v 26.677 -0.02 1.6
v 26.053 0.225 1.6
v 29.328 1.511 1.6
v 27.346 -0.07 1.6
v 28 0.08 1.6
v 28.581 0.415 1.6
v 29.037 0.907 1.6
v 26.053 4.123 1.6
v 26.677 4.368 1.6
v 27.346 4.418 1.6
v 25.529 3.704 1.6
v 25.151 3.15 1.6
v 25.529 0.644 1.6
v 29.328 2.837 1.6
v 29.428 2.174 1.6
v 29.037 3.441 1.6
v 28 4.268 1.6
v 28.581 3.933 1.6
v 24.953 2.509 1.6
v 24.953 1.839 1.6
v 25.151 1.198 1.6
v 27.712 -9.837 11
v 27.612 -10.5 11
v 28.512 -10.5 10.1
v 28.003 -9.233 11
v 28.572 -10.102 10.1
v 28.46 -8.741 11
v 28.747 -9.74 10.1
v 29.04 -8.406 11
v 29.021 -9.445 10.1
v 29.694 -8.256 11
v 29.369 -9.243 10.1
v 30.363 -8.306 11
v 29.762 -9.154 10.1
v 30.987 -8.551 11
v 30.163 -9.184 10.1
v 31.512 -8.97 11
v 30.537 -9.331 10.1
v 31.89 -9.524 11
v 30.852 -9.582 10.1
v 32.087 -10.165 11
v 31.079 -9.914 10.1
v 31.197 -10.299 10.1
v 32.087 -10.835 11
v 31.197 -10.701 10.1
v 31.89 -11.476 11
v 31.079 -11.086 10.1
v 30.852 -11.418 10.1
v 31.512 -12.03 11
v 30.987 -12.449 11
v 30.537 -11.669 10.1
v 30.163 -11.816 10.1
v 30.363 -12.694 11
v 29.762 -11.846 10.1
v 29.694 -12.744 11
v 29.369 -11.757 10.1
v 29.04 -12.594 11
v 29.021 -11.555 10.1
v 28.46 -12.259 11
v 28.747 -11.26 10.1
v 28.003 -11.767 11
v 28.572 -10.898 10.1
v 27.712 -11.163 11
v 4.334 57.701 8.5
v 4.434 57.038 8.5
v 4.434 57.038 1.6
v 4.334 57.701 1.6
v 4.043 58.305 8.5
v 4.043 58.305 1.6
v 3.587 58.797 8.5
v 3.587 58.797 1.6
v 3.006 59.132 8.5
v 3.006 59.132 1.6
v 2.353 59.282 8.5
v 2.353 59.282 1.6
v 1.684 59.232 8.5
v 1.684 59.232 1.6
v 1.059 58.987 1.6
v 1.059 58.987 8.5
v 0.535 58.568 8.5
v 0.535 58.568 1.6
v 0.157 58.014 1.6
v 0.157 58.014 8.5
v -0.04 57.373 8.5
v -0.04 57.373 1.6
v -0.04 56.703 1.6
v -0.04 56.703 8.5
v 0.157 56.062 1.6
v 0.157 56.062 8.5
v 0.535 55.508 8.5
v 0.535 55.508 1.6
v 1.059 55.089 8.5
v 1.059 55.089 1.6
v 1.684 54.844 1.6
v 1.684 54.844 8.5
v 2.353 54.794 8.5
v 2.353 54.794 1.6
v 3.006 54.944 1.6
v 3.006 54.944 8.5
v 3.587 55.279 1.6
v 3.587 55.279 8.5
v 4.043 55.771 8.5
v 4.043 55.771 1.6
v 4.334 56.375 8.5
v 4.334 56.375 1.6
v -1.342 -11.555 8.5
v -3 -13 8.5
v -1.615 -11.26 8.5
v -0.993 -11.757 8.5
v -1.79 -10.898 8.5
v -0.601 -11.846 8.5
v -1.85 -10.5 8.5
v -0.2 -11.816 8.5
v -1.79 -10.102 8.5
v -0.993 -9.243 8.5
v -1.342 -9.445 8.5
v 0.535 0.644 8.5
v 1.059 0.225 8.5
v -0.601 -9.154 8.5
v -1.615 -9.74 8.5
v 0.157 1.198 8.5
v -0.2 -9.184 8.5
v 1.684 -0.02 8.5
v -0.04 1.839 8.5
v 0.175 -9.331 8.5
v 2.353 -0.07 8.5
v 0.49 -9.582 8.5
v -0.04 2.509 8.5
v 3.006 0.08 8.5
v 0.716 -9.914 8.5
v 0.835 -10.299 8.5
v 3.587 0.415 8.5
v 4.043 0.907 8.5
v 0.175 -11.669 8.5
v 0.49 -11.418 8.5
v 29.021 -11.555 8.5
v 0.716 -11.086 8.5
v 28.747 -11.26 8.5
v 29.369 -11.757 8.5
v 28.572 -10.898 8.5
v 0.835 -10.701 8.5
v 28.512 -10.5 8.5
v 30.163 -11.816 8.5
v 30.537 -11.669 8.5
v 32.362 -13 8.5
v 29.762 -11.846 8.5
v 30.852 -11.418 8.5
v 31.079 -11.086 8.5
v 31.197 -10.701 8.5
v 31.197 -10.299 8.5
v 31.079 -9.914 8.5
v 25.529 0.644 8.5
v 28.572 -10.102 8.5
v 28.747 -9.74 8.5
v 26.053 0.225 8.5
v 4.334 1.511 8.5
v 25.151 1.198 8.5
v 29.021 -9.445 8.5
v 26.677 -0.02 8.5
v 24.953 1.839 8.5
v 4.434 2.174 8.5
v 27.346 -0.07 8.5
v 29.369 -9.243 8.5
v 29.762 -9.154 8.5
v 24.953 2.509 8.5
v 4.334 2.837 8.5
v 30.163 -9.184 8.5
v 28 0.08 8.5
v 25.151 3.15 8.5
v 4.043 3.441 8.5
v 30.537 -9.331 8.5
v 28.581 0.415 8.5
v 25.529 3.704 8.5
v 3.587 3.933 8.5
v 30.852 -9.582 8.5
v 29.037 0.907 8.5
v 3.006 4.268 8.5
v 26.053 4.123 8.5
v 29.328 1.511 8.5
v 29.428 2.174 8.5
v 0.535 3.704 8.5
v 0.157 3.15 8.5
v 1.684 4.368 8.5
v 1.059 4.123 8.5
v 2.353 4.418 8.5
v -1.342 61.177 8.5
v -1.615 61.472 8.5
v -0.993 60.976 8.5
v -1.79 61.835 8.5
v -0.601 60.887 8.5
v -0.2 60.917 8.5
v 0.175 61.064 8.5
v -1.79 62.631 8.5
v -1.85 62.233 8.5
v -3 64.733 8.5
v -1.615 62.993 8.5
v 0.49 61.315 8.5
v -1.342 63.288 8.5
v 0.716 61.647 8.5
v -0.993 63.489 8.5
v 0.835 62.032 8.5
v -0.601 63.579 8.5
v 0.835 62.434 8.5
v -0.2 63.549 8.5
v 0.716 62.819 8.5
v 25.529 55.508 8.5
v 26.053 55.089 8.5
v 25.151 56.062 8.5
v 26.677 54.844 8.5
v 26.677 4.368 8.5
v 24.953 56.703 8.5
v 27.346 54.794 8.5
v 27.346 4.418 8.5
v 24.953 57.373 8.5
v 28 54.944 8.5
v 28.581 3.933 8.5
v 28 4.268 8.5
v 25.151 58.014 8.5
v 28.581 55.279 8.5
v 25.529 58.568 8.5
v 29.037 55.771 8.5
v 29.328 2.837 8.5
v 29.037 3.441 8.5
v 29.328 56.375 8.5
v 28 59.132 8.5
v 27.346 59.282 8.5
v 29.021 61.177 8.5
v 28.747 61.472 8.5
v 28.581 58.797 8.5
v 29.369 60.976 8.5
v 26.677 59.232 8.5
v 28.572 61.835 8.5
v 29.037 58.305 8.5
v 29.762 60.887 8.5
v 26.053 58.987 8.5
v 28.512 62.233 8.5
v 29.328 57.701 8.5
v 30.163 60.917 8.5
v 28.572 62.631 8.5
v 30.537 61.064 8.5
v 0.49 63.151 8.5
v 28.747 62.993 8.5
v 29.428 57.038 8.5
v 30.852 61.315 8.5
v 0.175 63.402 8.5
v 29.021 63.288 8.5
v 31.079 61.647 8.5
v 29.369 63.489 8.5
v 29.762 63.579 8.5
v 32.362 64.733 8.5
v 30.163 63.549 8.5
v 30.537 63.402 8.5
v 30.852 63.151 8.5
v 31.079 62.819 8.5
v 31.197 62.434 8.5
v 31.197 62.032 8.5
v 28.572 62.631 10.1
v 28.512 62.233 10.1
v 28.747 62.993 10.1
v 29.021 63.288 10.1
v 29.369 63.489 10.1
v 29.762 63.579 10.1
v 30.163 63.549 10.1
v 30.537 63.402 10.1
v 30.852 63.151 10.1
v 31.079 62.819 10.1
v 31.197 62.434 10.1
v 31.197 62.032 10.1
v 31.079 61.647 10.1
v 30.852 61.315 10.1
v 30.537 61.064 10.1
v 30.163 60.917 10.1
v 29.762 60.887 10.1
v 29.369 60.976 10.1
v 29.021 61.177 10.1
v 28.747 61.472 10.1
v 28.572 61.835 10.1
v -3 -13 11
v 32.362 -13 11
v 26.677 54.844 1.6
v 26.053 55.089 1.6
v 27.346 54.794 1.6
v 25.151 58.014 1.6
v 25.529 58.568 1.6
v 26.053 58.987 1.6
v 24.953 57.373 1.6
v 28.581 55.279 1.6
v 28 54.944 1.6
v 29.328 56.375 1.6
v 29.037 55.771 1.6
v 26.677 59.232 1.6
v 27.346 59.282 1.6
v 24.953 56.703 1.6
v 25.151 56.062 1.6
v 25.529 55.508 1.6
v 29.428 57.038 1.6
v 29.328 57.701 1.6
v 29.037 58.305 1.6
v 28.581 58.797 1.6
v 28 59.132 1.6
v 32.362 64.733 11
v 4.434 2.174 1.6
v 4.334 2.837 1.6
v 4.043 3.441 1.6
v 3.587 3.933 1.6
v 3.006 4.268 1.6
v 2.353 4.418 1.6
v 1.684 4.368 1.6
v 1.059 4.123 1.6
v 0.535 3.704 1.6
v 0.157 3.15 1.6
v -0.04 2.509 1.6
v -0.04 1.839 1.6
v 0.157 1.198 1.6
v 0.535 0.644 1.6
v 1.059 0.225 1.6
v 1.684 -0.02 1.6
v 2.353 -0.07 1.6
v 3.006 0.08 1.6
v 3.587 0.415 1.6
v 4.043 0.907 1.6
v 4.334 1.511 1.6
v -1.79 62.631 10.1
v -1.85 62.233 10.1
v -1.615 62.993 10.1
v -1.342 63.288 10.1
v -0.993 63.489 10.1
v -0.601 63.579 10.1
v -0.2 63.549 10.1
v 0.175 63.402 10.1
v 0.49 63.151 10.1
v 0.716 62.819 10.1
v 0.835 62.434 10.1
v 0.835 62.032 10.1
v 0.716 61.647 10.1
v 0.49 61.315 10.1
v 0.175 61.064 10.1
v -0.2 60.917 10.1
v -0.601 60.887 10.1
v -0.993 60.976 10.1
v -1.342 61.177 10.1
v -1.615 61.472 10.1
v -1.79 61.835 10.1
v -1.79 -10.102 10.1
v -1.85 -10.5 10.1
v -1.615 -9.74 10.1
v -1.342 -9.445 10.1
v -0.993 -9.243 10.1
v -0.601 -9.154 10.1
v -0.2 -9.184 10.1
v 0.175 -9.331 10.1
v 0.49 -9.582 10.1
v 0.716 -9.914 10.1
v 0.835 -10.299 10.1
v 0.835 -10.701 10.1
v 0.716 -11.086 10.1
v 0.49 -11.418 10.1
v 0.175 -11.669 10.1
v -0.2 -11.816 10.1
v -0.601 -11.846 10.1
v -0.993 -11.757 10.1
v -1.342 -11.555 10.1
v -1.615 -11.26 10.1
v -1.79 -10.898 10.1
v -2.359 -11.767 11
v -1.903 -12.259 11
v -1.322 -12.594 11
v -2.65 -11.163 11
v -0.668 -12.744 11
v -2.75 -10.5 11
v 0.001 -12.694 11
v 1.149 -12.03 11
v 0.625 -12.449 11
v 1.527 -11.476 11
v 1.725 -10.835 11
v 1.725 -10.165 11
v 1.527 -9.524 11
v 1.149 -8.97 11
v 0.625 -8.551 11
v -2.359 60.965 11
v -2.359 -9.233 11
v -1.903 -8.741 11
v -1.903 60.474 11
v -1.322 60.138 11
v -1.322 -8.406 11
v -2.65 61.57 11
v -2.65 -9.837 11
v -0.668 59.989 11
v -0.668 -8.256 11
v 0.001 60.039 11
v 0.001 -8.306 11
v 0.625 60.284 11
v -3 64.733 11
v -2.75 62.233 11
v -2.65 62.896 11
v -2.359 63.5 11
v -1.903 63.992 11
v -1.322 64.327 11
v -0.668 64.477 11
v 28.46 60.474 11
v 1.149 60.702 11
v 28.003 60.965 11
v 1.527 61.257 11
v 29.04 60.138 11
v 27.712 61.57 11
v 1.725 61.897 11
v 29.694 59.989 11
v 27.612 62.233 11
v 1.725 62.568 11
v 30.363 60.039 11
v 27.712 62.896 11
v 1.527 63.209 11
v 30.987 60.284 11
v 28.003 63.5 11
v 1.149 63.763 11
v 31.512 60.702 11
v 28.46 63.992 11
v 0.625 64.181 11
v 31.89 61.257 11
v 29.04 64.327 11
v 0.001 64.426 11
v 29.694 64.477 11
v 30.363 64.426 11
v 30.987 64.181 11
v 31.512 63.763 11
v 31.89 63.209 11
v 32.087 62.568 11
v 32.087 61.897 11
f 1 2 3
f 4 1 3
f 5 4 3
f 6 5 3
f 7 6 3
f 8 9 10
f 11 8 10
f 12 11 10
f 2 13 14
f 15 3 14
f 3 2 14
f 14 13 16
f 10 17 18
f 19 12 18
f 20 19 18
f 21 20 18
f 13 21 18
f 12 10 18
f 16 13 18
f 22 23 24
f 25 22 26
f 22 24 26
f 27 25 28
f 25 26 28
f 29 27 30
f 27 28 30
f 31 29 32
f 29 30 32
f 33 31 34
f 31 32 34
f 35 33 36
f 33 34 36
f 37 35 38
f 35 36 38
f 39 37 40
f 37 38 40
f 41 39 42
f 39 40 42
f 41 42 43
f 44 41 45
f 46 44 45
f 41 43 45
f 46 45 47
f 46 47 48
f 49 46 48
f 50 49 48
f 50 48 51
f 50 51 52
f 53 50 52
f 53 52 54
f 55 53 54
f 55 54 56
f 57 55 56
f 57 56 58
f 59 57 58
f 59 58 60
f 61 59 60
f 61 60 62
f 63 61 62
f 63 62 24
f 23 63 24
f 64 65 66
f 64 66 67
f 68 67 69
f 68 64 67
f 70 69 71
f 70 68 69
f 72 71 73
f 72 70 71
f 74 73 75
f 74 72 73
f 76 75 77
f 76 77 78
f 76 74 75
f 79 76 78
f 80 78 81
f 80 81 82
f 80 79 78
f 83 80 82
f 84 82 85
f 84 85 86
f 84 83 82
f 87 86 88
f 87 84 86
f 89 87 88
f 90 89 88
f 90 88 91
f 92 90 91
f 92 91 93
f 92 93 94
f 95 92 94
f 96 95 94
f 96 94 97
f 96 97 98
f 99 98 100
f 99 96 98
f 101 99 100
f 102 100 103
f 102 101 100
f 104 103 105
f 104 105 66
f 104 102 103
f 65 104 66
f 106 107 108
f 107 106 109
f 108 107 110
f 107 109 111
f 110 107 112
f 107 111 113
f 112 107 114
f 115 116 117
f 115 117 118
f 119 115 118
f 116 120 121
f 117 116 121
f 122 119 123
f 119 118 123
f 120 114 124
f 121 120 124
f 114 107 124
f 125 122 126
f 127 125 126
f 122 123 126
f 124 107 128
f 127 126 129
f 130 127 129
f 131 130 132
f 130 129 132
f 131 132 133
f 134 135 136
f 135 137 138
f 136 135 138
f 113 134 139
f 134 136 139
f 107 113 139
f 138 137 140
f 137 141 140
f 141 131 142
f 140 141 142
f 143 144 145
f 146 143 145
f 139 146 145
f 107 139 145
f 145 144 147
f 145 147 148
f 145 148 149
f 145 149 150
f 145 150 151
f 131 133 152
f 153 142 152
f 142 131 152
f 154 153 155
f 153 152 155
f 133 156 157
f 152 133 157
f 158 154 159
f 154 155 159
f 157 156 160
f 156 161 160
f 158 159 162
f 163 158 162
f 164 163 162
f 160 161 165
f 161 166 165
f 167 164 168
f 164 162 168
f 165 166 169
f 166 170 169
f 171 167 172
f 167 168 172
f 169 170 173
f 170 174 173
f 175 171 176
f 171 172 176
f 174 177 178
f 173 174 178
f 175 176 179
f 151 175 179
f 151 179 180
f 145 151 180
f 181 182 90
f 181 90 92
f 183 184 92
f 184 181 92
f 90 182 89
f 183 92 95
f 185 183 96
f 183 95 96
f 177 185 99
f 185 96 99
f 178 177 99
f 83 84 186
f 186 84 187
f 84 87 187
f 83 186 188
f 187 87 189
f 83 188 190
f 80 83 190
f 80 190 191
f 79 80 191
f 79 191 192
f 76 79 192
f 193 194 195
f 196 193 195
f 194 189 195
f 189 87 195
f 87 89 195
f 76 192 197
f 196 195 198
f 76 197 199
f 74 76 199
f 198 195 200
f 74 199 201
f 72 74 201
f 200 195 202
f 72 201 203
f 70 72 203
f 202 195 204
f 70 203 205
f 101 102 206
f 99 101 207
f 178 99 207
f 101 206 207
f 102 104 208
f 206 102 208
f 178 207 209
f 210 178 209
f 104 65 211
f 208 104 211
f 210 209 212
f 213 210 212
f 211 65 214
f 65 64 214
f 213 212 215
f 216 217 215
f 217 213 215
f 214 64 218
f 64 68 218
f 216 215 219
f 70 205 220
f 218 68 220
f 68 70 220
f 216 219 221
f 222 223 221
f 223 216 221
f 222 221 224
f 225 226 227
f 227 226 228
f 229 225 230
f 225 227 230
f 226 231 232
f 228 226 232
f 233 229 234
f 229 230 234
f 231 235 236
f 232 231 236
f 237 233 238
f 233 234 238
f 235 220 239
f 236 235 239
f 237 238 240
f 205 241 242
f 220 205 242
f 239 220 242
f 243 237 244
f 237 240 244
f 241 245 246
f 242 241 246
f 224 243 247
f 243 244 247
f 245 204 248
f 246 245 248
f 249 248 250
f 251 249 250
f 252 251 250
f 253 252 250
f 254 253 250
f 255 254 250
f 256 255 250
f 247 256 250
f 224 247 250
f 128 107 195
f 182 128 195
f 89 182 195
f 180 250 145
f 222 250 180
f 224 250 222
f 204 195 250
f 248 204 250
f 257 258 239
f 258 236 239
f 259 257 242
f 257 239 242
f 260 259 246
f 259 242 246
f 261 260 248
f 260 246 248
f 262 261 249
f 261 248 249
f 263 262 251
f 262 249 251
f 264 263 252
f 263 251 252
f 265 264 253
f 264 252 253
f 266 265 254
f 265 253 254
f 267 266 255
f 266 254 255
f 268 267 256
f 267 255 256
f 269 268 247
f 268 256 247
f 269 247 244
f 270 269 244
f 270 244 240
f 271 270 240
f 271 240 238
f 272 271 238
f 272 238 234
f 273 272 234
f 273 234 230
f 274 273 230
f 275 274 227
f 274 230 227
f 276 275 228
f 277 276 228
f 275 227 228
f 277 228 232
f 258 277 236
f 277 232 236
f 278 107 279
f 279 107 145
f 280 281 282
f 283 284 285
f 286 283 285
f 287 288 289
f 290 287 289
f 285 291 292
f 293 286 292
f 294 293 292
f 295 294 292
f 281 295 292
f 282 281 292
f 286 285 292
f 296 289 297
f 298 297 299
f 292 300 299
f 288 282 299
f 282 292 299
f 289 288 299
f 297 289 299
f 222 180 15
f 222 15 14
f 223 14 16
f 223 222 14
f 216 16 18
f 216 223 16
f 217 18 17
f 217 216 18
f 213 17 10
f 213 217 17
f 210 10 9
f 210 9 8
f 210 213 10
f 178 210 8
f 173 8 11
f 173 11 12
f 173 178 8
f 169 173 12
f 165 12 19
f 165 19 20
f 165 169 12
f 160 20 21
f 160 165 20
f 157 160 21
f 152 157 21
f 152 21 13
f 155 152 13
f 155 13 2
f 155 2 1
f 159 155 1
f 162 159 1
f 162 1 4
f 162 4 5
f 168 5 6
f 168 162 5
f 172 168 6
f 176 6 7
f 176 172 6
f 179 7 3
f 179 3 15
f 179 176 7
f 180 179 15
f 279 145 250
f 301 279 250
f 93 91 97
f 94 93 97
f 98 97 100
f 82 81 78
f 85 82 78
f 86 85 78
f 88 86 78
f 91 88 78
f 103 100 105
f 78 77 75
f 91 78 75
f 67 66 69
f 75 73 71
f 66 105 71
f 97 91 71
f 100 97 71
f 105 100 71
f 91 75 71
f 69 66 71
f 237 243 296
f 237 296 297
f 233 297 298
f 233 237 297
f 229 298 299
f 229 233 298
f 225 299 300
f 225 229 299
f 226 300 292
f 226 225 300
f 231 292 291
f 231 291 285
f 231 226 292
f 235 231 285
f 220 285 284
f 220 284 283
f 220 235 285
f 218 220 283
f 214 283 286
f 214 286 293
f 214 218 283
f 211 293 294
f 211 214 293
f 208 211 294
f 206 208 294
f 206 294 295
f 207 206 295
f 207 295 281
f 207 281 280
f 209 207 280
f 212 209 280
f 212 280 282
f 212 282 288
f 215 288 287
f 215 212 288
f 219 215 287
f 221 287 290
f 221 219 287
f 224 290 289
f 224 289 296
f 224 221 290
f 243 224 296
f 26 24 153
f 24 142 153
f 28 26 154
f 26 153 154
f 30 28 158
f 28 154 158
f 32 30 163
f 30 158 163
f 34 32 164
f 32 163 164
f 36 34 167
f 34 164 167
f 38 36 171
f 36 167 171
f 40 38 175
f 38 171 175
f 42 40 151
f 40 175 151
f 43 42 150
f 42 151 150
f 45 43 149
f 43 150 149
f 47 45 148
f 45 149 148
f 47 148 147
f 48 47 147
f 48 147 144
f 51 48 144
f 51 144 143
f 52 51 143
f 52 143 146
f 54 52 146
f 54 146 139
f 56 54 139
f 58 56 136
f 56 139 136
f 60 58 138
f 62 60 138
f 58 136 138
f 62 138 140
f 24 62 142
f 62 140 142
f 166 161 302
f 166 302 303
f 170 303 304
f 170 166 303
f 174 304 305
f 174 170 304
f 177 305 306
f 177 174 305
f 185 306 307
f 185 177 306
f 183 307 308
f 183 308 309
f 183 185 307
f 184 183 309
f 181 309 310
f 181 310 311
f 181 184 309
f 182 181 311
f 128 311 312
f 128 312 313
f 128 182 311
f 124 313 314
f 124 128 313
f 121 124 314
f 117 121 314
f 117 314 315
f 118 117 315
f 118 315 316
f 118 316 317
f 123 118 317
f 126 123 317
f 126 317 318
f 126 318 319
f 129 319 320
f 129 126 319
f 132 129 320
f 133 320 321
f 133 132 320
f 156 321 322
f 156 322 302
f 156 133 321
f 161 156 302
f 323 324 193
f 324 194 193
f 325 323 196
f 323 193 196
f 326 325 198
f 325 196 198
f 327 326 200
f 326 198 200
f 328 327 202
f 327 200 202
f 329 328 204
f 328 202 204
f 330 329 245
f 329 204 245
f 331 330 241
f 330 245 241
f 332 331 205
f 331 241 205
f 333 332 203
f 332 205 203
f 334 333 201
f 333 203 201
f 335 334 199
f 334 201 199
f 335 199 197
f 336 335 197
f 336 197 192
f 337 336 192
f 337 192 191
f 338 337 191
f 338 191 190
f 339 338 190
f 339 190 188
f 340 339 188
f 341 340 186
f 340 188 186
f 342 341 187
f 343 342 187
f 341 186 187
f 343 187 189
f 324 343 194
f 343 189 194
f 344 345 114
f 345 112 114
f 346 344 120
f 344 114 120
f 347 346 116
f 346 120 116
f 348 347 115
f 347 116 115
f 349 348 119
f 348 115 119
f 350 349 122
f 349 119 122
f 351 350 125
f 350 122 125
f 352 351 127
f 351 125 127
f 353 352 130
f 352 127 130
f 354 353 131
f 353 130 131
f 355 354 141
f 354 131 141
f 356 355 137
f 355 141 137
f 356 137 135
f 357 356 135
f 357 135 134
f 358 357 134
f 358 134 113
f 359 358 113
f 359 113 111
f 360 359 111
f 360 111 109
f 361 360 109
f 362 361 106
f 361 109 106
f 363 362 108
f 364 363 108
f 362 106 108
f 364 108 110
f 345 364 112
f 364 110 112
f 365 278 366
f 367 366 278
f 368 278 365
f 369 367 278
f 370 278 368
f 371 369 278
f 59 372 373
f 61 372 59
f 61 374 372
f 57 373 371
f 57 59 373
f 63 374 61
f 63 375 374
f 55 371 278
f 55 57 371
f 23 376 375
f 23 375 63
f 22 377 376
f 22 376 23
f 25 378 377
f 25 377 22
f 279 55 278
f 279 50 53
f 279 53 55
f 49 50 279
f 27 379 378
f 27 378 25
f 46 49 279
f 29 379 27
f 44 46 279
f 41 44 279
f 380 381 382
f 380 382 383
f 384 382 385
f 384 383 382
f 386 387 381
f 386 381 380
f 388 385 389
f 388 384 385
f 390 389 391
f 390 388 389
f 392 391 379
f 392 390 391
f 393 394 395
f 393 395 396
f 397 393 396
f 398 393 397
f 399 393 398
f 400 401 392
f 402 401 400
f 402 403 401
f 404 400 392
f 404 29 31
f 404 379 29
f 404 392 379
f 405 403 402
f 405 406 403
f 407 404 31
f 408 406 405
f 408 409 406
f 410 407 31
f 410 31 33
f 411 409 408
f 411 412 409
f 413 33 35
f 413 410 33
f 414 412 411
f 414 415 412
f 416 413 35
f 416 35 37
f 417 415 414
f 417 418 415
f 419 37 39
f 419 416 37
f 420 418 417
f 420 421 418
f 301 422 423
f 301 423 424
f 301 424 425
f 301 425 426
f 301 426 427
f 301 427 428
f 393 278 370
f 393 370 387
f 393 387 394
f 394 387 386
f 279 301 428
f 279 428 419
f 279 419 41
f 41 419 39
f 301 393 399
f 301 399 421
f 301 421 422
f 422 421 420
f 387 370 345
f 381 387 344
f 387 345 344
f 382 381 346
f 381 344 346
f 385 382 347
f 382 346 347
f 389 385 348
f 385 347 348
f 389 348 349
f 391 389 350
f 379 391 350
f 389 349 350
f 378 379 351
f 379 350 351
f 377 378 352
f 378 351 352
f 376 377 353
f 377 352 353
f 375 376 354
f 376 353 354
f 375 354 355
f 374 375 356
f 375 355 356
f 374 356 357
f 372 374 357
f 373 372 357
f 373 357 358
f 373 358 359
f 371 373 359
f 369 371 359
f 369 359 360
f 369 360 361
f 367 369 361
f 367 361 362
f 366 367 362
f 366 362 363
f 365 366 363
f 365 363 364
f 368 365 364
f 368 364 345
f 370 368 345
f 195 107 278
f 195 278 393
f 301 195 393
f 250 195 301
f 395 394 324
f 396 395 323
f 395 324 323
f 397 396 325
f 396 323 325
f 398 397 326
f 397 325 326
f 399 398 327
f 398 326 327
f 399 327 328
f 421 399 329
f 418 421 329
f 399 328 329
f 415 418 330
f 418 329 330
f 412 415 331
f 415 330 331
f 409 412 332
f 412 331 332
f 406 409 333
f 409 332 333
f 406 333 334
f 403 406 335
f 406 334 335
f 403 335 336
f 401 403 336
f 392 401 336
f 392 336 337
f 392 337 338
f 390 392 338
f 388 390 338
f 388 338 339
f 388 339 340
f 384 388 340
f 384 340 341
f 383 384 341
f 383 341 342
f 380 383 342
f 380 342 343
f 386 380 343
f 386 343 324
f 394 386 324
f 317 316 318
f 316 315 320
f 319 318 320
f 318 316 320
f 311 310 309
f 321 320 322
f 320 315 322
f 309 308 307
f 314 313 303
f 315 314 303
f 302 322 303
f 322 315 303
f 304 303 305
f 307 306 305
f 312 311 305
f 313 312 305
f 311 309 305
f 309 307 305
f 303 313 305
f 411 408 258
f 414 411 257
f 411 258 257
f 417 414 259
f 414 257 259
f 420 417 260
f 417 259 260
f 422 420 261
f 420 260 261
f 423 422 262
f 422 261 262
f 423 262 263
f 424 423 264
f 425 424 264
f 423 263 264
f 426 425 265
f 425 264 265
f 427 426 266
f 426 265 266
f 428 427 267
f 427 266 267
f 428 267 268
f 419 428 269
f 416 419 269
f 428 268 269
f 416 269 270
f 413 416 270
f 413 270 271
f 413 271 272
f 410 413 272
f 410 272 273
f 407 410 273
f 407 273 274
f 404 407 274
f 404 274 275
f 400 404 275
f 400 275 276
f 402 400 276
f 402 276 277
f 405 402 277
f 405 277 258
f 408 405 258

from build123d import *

# Parameters (mm, degrees)
SKETCH009_W      = 35.3624
SKETCH009_H      = 77.7328
PAD004_DEPTH     = 2.5
SKETCH010_R      = 2.25
PAD005_DEPTH     = 6.9
HOLE_D           = 2.7
HOLE_CSINK_D     = 4.5
HOLE_CSINK_ANGLE = 90


with BuildPart() as part:
    # Sketch009 (on CopyDatumPlane) → Pad004 (new body)
    with BuildSketch(Plane.XY.offset(8.5)):
        with Locations((14.6812, 25.8664)):
            Rectangle(SKETCH009_W, SKETCH009_H)
    extrude(amount=PAD004_DEPTH)

    # Sketch010 (on CopyDatumPlane) → Pad005 (join)
    with BuildSketch(Plane.XY.offset(8.5)):
        with Locations((2.1844, 57.038)):
            Circle(SKETCH010_R)
        with Locations((27.178, 57.038)):
            Circle(SKETCH010_R)
        with Locations((27.178, 2.174)):
            Circle(SKETCH010_R)
        with Locations((2.1844, 2.174)):
            Circle(SKETCH010_R)
    extrude(amount=-PAD005_DEPTH)

    # Hole (through all)
    with Locations(Plane.XY.offset(11)):
        with Locations((-0.5, 62.2328), (29.8624, 62.2328), (29.8624, -10.5), (-0.5, -10.5)):
            CounterSinkHole(HOLE_D / 2, HOLE_CSINK_D / 2, counter_sink_angle=HOLE_CSINK_ANGLE)


solid = part.part
